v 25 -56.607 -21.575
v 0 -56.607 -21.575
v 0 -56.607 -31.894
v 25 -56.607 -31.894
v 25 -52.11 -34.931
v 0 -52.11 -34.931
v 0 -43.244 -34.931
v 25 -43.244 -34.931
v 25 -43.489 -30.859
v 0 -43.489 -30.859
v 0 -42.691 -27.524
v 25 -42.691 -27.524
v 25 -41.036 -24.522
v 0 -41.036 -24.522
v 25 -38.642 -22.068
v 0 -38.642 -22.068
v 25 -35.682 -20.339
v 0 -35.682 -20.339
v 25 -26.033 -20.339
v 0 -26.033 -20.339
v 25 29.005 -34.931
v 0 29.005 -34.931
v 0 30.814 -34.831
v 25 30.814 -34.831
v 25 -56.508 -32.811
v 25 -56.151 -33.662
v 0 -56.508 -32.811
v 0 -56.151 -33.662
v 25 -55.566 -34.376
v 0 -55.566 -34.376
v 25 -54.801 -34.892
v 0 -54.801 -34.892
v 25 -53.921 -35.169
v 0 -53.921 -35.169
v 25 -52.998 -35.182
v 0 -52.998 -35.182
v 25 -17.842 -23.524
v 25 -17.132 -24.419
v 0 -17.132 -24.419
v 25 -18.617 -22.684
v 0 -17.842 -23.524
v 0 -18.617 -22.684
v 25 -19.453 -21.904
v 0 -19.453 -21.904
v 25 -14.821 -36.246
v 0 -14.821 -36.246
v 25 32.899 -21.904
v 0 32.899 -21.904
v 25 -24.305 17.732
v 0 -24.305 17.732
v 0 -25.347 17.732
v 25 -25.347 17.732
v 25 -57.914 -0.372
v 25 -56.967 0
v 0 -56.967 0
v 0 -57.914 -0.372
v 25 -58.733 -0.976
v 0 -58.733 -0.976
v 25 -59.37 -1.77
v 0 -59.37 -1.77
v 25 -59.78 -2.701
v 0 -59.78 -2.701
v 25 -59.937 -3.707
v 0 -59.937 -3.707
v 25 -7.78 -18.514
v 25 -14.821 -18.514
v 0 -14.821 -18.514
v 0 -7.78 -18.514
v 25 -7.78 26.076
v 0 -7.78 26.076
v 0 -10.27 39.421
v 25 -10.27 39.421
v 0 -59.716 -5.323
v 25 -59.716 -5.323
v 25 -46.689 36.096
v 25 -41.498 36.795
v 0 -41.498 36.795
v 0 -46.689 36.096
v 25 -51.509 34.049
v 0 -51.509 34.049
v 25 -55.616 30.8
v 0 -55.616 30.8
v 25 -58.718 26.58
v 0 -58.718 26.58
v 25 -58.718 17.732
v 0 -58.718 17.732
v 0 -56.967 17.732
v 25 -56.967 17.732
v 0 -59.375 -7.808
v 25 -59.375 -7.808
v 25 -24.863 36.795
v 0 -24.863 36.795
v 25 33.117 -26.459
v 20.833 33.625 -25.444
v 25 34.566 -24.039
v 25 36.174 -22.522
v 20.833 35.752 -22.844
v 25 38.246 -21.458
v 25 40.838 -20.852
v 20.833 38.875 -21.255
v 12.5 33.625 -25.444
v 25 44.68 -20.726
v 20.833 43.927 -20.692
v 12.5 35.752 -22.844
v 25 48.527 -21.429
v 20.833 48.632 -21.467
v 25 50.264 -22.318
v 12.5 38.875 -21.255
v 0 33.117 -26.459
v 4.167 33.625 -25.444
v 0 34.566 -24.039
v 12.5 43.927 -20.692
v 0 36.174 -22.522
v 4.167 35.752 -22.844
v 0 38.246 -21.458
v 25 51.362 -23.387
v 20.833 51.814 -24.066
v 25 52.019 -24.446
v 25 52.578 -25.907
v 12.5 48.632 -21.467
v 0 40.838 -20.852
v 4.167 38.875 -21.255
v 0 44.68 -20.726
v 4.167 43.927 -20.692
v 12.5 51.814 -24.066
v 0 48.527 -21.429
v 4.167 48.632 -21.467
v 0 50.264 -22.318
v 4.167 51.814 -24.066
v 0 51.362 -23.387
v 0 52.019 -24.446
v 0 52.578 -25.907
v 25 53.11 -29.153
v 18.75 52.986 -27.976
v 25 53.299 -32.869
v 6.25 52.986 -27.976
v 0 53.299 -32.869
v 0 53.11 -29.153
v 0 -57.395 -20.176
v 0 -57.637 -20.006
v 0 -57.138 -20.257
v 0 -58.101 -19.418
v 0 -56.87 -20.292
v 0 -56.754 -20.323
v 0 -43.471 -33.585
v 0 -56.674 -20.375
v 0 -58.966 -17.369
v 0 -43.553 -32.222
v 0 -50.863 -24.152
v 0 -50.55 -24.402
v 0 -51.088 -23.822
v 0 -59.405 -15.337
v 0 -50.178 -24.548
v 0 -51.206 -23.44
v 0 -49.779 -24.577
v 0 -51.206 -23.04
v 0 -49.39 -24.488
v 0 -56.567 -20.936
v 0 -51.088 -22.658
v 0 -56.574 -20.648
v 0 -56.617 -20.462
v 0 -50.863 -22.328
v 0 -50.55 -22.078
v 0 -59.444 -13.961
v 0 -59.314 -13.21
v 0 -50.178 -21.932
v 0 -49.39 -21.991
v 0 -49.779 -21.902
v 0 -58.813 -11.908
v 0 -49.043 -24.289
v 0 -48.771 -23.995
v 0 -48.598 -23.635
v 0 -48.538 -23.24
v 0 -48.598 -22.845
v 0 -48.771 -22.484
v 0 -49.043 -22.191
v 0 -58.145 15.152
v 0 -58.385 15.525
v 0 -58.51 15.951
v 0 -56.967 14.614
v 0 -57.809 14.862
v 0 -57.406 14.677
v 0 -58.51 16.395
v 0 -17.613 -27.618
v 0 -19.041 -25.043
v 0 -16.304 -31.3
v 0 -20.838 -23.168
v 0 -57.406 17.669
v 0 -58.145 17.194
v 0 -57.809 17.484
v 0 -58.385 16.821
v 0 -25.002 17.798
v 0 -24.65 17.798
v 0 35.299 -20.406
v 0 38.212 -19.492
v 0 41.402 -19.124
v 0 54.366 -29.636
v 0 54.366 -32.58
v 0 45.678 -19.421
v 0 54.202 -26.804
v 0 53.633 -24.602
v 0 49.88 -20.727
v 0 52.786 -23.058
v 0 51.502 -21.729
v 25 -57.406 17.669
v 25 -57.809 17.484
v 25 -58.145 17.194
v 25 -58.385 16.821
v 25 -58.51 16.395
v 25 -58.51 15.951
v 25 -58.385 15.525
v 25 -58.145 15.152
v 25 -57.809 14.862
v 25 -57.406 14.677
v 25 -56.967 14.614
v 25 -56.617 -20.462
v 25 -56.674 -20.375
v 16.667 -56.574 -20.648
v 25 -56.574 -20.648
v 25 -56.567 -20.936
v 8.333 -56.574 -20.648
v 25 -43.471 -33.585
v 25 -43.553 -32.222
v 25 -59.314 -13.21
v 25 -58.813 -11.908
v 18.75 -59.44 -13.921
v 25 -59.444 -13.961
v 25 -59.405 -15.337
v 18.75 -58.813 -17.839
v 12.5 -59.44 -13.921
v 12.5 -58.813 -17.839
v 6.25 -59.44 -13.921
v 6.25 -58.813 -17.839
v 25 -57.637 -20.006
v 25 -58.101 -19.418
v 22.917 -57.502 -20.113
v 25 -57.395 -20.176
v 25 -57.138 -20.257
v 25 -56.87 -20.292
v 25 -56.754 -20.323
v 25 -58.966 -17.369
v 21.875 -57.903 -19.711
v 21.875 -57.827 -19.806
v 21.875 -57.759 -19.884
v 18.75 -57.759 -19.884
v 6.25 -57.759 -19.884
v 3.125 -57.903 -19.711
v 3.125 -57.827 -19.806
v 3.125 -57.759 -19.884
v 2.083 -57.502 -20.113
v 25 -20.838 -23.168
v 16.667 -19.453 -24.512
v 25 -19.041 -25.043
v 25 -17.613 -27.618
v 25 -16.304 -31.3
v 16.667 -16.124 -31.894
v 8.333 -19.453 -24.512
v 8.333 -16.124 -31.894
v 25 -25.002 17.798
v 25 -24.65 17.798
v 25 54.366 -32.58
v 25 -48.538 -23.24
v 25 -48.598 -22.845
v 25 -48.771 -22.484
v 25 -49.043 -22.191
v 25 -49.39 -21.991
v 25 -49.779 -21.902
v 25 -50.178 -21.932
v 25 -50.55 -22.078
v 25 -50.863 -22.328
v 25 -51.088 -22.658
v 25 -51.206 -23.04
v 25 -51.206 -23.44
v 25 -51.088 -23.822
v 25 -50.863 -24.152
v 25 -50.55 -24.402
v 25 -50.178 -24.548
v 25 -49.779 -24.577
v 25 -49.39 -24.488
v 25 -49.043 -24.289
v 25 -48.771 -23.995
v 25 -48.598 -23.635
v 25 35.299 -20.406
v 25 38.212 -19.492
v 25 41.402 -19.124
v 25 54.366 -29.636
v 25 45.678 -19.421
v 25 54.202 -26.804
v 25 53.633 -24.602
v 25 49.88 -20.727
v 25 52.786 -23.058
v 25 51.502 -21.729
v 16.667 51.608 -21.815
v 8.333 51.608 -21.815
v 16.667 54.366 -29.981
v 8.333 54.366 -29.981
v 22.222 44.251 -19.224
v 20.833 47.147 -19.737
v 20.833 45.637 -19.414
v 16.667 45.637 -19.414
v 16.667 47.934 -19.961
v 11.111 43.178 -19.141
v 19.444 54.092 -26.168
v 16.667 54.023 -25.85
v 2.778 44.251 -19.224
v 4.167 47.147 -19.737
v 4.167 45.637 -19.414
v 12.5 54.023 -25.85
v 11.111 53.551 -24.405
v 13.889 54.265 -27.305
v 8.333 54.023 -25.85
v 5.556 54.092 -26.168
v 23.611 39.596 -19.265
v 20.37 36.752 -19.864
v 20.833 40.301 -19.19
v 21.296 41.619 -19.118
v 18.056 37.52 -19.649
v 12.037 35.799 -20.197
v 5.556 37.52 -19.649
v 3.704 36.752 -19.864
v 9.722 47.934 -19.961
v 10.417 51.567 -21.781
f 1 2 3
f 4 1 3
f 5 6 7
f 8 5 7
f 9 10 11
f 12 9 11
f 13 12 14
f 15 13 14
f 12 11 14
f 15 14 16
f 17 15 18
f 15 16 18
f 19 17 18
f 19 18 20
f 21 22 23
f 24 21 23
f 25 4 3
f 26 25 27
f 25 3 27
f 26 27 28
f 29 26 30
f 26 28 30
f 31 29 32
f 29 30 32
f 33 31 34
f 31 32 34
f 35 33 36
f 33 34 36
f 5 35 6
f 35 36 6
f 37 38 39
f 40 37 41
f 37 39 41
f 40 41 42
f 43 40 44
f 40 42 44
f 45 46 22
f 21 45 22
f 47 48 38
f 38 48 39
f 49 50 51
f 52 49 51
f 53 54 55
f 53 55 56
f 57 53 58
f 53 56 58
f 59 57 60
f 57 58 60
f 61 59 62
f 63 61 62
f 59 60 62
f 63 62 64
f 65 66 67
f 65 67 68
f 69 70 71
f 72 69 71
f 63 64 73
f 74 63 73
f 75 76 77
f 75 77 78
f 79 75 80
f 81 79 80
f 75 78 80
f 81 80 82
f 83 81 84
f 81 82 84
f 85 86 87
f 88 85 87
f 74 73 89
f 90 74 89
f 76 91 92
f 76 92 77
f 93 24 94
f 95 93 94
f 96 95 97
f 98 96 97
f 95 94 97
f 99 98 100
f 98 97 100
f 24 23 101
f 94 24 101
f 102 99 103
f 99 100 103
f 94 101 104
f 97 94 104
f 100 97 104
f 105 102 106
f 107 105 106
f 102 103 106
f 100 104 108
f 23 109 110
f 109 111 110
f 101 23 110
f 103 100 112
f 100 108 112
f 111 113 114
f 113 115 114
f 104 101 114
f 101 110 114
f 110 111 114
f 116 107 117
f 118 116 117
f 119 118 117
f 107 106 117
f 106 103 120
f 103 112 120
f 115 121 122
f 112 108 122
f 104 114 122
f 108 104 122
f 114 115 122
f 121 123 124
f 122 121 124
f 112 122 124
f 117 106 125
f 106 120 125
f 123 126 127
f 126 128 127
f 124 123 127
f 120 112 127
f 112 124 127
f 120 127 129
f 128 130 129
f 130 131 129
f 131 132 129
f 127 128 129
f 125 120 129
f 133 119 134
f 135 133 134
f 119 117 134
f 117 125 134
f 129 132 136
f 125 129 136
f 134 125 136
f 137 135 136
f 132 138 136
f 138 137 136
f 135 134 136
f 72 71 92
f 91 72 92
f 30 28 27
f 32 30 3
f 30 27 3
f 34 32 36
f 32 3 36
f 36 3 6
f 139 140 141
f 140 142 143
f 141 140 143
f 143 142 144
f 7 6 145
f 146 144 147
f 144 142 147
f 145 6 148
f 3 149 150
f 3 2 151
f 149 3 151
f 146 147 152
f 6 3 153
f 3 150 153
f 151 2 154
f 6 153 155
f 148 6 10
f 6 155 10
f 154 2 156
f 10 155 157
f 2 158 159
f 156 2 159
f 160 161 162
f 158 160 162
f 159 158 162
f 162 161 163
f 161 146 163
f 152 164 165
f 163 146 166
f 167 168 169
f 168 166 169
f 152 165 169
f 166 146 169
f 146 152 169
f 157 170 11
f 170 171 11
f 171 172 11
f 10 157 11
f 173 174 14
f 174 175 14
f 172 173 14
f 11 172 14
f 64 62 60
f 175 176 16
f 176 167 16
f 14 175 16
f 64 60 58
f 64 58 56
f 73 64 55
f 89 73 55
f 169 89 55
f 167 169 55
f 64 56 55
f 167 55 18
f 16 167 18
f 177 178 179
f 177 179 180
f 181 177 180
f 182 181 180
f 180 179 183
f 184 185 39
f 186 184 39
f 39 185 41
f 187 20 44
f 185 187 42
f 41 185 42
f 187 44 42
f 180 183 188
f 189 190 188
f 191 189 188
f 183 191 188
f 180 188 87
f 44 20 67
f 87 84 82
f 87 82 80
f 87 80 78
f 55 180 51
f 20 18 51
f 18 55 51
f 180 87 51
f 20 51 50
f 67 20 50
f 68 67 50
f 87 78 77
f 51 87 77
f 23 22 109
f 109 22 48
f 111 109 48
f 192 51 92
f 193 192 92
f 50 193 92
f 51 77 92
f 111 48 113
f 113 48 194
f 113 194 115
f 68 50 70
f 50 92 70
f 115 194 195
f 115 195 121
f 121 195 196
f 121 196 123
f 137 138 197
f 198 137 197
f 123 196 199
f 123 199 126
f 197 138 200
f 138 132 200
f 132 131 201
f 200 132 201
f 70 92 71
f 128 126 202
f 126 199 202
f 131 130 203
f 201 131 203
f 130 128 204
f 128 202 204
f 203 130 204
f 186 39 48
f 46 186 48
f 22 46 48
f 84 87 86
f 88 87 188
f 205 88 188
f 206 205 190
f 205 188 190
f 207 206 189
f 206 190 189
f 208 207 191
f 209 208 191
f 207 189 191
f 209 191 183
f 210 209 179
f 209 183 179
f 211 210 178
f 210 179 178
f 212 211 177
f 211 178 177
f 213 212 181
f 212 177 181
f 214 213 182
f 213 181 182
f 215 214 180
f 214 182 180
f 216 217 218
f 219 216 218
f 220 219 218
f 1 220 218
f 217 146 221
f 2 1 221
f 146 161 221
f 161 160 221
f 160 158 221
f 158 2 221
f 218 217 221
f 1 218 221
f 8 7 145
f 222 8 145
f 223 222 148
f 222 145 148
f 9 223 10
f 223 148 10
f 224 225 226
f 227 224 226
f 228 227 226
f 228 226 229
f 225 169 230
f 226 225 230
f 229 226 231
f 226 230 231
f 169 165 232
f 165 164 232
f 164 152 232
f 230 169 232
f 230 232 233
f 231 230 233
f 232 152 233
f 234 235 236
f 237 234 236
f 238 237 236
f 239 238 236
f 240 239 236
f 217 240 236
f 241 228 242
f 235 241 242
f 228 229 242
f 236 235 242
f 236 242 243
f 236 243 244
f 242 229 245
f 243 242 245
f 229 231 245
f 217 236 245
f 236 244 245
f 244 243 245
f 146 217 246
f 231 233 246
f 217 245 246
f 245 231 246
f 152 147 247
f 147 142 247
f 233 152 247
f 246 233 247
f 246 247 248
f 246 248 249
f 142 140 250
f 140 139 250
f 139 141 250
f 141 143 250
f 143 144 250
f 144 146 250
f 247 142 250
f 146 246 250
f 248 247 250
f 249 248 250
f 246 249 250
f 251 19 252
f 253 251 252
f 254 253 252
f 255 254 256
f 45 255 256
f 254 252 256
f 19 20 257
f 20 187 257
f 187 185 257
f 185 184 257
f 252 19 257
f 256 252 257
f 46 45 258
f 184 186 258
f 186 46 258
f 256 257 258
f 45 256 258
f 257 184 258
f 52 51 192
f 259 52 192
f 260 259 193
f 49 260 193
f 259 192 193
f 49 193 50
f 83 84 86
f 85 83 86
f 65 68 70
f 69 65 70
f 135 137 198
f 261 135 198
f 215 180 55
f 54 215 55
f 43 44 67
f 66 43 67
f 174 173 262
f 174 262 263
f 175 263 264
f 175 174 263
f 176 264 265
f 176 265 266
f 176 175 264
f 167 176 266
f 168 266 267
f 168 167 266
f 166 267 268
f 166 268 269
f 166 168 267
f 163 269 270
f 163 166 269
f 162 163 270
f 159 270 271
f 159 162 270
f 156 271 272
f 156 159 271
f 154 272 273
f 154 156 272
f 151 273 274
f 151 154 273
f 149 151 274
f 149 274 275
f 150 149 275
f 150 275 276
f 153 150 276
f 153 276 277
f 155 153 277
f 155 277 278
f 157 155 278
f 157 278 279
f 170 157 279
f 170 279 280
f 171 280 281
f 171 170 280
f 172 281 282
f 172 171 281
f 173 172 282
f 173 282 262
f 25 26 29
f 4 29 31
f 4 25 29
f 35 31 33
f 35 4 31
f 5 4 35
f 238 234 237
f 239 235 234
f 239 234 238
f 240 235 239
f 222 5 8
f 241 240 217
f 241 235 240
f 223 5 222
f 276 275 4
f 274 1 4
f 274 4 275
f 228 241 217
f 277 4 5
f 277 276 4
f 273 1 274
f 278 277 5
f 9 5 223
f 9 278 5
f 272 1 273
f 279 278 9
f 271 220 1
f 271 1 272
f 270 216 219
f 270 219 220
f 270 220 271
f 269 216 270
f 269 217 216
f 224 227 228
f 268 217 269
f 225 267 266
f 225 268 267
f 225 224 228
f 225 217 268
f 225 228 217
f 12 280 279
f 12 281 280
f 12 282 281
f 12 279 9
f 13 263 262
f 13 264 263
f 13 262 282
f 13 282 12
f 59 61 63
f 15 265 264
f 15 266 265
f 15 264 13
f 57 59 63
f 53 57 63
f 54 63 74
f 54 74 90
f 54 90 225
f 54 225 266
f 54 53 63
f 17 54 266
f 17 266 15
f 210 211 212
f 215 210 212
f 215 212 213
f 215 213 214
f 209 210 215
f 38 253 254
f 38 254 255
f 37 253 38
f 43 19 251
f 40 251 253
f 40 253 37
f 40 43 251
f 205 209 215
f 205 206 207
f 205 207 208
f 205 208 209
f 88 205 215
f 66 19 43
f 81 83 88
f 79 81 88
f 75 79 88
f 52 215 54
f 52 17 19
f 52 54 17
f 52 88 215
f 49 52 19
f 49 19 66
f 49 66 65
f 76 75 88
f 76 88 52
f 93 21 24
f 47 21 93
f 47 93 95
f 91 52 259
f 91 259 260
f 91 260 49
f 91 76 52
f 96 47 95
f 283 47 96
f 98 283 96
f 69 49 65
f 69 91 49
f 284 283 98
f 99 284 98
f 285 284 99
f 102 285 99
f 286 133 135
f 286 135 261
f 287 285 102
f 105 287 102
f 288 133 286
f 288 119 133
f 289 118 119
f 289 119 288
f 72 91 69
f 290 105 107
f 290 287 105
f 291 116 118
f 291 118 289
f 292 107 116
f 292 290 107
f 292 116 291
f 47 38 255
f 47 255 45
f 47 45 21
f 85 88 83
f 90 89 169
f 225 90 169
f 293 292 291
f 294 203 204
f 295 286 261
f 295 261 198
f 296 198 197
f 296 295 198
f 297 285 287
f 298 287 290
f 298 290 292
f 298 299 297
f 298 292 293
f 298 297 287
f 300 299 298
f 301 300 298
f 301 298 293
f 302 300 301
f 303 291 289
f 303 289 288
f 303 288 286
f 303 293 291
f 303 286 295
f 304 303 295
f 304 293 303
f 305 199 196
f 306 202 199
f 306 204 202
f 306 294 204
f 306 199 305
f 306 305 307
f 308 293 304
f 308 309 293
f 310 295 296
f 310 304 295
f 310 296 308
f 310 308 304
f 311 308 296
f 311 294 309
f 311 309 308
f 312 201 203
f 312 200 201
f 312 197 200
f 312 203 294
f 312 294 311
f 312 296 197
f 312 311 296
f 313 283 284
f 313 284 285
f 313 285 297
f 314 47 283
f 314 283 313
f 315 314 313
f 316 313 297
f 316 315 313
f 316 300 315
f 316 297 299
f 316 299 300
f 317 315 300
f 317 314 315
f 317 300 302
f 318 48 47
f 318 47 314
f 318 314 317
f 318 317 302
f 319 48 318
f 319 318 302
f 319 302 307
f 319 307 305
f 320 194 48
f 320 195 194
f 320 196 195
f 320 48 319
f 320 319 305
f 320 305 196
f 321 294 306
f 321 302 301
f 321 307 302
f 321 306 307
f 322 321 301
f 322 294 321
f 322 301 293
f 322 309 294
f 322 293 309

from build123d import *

# Parameters (mm, degrees)
F0_R     = 1.3413013151
F1_DEPTH = 25


with BuildPart() as f1:
    # F0 (on Right) → F1 (new body)
    with BuildSketch(Plane.YZ):
        with BuildLine():
            Line((-59.7156846646, -5.3227093567), (-59.375019744, -7.8075606143))
            Line((-59.375019744, -7.8075606143), (-55.9374617497, -7.8075606143))
            Line((-55.9374617497, -7.8075606143), (-33.3346764091, -5.6247393992))
            Line((-33.3346764091, -5.6247393992), (-33.3346764091, -2.3953433202))
            Line((-33.3346764091, -2.3953433202), (-33.3346764091, 2.3429190912))
            Line((-33.3346764091, 2.3429190912), (-33.3346764091, 17.7317894995))
            Line((-33.3346764091, 17.7317894995), (-56.9665580988, 17.7317894995))
            ThreePointArc((-56.9665580988, 17.7317894995), (-58.5253667086, 16.1729808897), (-56.9665580988, 14.6141722798))
            Line((-56.9665580988, 14.6141722798), (-56.9665580988, 0))
            ThreePointArc((-56.9665580988, 0), (-59.0775962213, -1.3520532806), (-59.937197715, -3.706966294))
            Line((-59.937197715, -3.706966294), (-59.7156846646, -5.3227093567))
        make_face()
        with BuildLine():
            Line((-58.7176652625, 17.7317894995), (-56.9665580988, 17.7317894995))
            Line((-56.9665580988, 17.7317894995), (-33.3346764091, 17.7317894995))
            Line((-33.3346764091, 17.7317894995), (-25.3467038274, 17.7317894995))
            ThreePointArc((-25.3467038274, 17.7317894995), (-24.8258609208, 17.8061958286), (-24.3050180143, 17.7317894995))
            Line((-24.3050180143, 17.7317894995), (-20.1933458447, 17.7317894995))
            add(Edge.make_bspline(
                [(-20.1933458447, 17.7317894995), (-20.1273708915, 21.1809682656), (-20.2524642573, 26.8966571713), (-23.6691484873, 28.1730388401), (-25.4466654733, 28.6230146885)],
                knots=[0, 0, 0, 0, 0.5753069191, 1, 1, 1, 1], degree=3))
            Line((-25.4466654733, 28.6230146885), (-25.4466654733, 36.7948412895))
            Line((-25.4466654733, 36.7948412895), (-41.4984645322, 36.7948412895))
            ThreePointArc((-41.4984645322, 36.7948412895), (-51.5089923737, 34.0490123941), (-58.7176652625, 26.5800580382))
            Line((-58.7176652625, 26.5800580382), (-58.7176652625, 17.7317894995))
        make_face()
        with BuildLine():
            Line((-33.3346764091, 17.7317894995), (-33.3346764091, 2.3429190912))
            Line((-33.3346764091, 2.3429190912), (-25.3467038274, 3.7005587947))
            ThreePointArc((-25.3467038274, 3.7005587947), (-23.6209226102, 5.0092447236), (-22.9657124728, 7.0736282505))
            Line((-22.9657124728, 7.0736282505), (-22.9657124728, 15.9460473806))
            ThreePointArc((-22.9657124728, 15.9460473806), (-23.3377417433, 17.0621358906), (-24.3050180143, 17.7317894995))
            Line((-24.3050180143, 17.7317894995), (-25.3467038274, 17.7317894995))
            Line((-25.3467038274, 17.7317894995), (-33.3346764091, 17.7317894995))
        make_face()
        with BuildLine():
            Line((-59.375019744, -7.8075606143), (-58.812841773, -11.9081549346))
            Line((-58.812841773, -11.9081549346), (-56.2285371125, -11.9081549346))
            Line((-56.2285371125, -11.9081549346), (-55.1892034709, -20.3746967018))
            Line((-55.1892034709, -20.3746967018), (-44.014878571, -19.8975186795))
            Line((-44.014878571, -19.8975186795), (-38.4535634784, -15.2970959109))
            Line((-38.4535634784, -15.2970959109), (-7.780038286, -14.0707446262))
            Line((-7.780038286, -14.0707446262), (-7.780038286, 26.0761603713))
            Line((-7.780038286, 26.0761603713), (-10.2704176679, 39.4214987755))
            Line((-10.2704176679, 39.4214987755), (-24.8629627749, 36.7948412895))
            Line((-24.8629627749, 36.7948412895), (-25.4466654733, 36.7948412895))
            Line((-25.4466654733, 36.7948412895), (-25.4466654733, 28.6230146885))
            add(Edge.make_bspline(
                [(-20.1933458447, 17.7317894995), (-20.1273708915, 21.1809682656), (-20.2524642573, 26.8966571713), (-23.6691484873, 28.1730388401), (-25.4466654733, 28.6230146885)],
                knots=[0, 0, 0, 0, 0.5753069191, 1, 1, 1, 1], degree=3))
            Line((-20.1933458447, 17.7317894995), (-24.3050180143, 17.7317894995))
            ThreePointArc((-24.3050180143, 17.7317894995), (-23.3377417433, 17.0621358906), (-22.9657124728, 15.9460473806))
            Line((-22.9657124728, 15.9460473806), (-22.9657124728, 7.0736282505))
            ThreePointArc((-22.9657124728, 7.0736282505), (-23.6209226102, 5.0092447236), (-25.3467038274, 3.7005587947))
            Line((-25.3467038274, 3.7005587947), (-33.3346764091, 2.3429190912))
            Line((-33.3346764091, 2.3429190912), (-33.3346764091, -2.3953433202))
            Line((-33.3346764091, -2.3953433202), (-33.3346764091, -5.6247393992))
            Line((-33.3346764091, -5.6247393992), (-55.9374617497, -7.8075606143))
            Line((-55.9374617497, -7.8075606143), (-59.375019744, -7.8075606143))
        make_face()
        with BuildLine():
            Line((-33.3346764091, -10.6459222734), (-33.3346764091, -6.5242550336))
            Line((-33.3346764091, -6.5242550336), (-30.7647838399, -6.5242550336))
            Line((-30.7647838399, -6.5242550336), (-18.2555336505, -5.3161978722))
            Line((-18.2555336505, -5.3161978722), (-18.2555336505, -12.643808499))
            Line((-18.2555336505, -12.643808499), (-30.8102872972, -13.1457572697))
            Line((-30.8102872972, -13.1457572697), (-33.3346764091, -13.2466843007))
            Line((-33.3346764091, -13.2466843007), (-43.0865399539, -13.6365713552))
            Line((-43.0865399539, -13.6365713552), (-44.5091923977, -13.0241444813))
            Line((-44.5091923977, -13.0241444813), (-40.7882420624, -7.8148144776))
            Line((-40.7882420624, -7.8148144776), (-36.5414358675, -6.4670089632))
            ThreePointArc((-36.5414358675, -6.4670089632), (-38.4535634784, -8.2143949485), (-39.346460253, -10.6459222734))
            Line((-39.346460253, -10.6459222734), (-33.3346764091, -10.6459222734))
        make_face(mode=Mode.SUBTRACT)
        Polygon((-18.2555336505, -5.3161978722), (-30.7647838399, -6.5242550336), (-31.4434171614, -6.5897927622), (-30.8102872972, -13.1457572697), (-18.2555336505, -12.643808499), align=None)
        with BuildLine():
            Line((-33.3346764091, -13.2466843007), (-33.3346764091, -10.6459222734))
            Line((-33.3346764091, -10.6459222734), (-39.346460253, -10.6459222734))
            ThreePointArc((-39.346460253, -10.6459222734), (-38.4535634784, -8.2143949485), (-36.5414358675, -6.4670089632))
            Line((-36.5414358675, -6.4670089632), (-40.7882420624, -7.8148144776))
            Line((-40.7882420624, -7.8148144776), (-44.5091923977, -13.0241444813))
            Line((-44.5091923977, -13.0241444813), (-43.0865399539, -13.6365713552))
            Line((-43.0865399539, -13.6365713552), (-33.3346764091, -13.2466843007))
        make_face()
        Polygon((-30.7647838399, -6.5242550336), (-33.3346764091, -6.5242550336), (-33.3346764091, -10.6459222734), (-33.3346764091, -13.2466843007), (-30.8102872972, -13.1457572697), (-31.4434171614, -6.5897927622), align=None)
        with BuildLine():
            add(Edge.make_bspline(
                [(-58.812841773, -11.9081549346), (-59.0880915502, -12.5121118478), (-59.7415991693, -13.9438196544), (-59.0499376213, -17.7493049639), (-57.6436367472, -20.4556878145), (-56.8074801086, -20.2422530768), (-56.6742494702, -20.3746967018)],
                knots=[0, 0, 0, 0, 0.2060210321, 0.4886513543, 0.7243907608, 0.8444142223, 0.8444142223, 0.8444142223, 0.8444142223], degree=3))
            Line((-56.6742494702, -20.3746967018), (-55.1892034709, -20.3746967018))
            Line((-55.1892034709, -20.3746967018), (-56.2285371125, -11.9081549346))
            Line((-56.2285371125, -11.9081549346), (-58.812841773, -11.9081549346))
        make_face()
        with BuildLine():
            Line((-52.1095097065, -34.9311500469), (-43.2436168194, -34.9311500469))
            ThreePointArc((-43.2436168194, -34.9311500469), (-43.5297296599, -32.904680643), (-43.4886334872, -30.8585257352))
            ThreePointArc((-43.4886334872, -30.8585257352), (-43.4937767675, -30.8193585401), (-43.4987837121, -30.7801736833))
            ThreePointArc((-43.4987837121, -30.7801736833), (-41.8021007863, -23.2493696081), (-35.6815308332, -18.5450772681))
            Line((-35.6815308332, -18.5450772681), (-26.0333530605, -18.5450772681))
            ThreePointArc((-26.0333530605, -18.5450772681), (-22.5385309182, -19.8240557823), (-19.4525133934, -21.9039749354))
            Line((-19.4525133934, -21.9039749354), (-14.8206017911, -18.5140725225))
            Line((-14.8206017911, -18.5140725225), (-7.780038286, -18.5140725225))
            Line((-7.780038286, -18.5140725225), (-7.780038286, -14.0707446262))
            Line((-7.780038286, -14.0707446262), (-38.4535634784, -15.2970959109))
            Line((-38.4535634784, -15.2970959109), (-44.014878571, -19.8975186795))
            Line((-44.014878571, -19.8975186795), (-55.1892034709, -20.3746967018))
            Line((-55.1892034709, -20.3746967018), (-56.6742494702, -20.3746967018))
            add(Edge.make_bspline(
                [(-56.6742494702, -20.3746967018), (-56.5015432992, -20.5463826715), (-56.5789833997, -21.061622237), (-56.6074683325, -21.5753372759)],
                knots=[0.8444142223, 0.8444142223, 0.8444142223, 0.8444142223, 1, 1, 1, 1], degree=3))
            Line((-56.6074683325, -21.5753372759), (-56.6074683325, -31.8935360586))
            ThreePointArc((-56.6074683325, -31.8935360586), (-55.2022069666, -34.6616816563), (-52.1095097065, -34.9311500469))
        make_face()
        Polygon((-44.1664493774, -27.5487947282), (-43.4987837121, -30.7801736833), (-53.4819326623, -30.7801736833), (-53.8981630598, -27.5487947282), align=None, mode=Mode.SUBTRACT)
        with Locations((-49.8796105385, -23.2399087399)):
            Circle(F0_R, mode=Mode.SUBTRACT)
        with BuildLine():
            ThreePointArc((-43.4987837121, -30.7801736833), (-43.4937767675, -30.8193585401), (-43.4886334872, -30.8585257352))
            ThreePointArc((-43.4886334872, -30.8585257352), (-41.0356858712, -24.5223526476), (-35.6815308332, -20.3394033015))
            Line((-35.6815308332, -20.3394033015), (-26.0333530605, -20.3394033015))
            add(Edge.make_bspline(
                [(-26.0333530605, -20.3394033015), (-23.5843678368, -21.417930462), (-18.6388446996, -23.5959268726), (-16.1289011783, -31.861291049), (-15.2128944865, -34.9311500469), (-14.8206017911, -36.2458601594)],
                knots=[0, 0, 0, 0, 0.3593217541, 0.7256205678, 1, 1, 1, 1], degree=3))
            Line((-14.8206017911, -36.2458601594), (29.0052741766, -34.9311500469))
            add(Edge.make_bspline(
                [(29.0052741766, -34.9311500469), (28.9461622845, -34.6352556147), (29.0665782696, -33.4379145503), (29.1845194302, -25.1447405222), (32.8987687826, -21.9039749354)],
                knots=[0, 0, 0, 0, 0.0823028073, 0.3344678299, 0.3344678299, 0.3344678299, 0.3344678299], degree=3))
            Line((32.8987687826, -21.9039749354), (-17.1318468102, -24.4185392752))
            ThreePointArc((-17.1318468102, -24.4185392752), (-18.2221301436, -23.0966086911), (-19.4525133934, -21.9039749354))
            ThreePointArc((-19.4525133934, -21.9039749354), (-22.5385309182, -19.8240557823), (-26.0333530605, -18.5450772681))
            Line((-26.0333530605, -18.5450772681), (-35.6815308332, -18.5450772681))
            ThreePointArc((-35.6815308332, -18.5450772681), (-41.8021007863, -23.2493696081), (-43.4987837121, -30.7801736833))
        make_face()
        Polygon((-14.6168977418, -32.0090957925), (-14.6168977418, -29.7341951177), (-7.694104896, -29.5795624227), (26.7578526936, -28.8100176498), (25.0516771875, -32.0090957925), (-7.6398370158, -32.0090957925), align=None, mode=Mode.SUBTRACT)
        with BuildLine():
            add(Edge.make_bspline(
                [(29.0052741766, -34.9311500469), (28.9461622845, -34.6352556147), (29.0665782696, -33.4379145503), (29.1845194302, -25.1447405222), (32.8987687826, -21.9039749354)],
                knots=[0, 0, 0, 0, 0.0823028073, 0.3344678299, 0.3344678299, 0.3344678299, 0.3344678299], degree=3))
            Line((29.0052741766, -34.9311500469), (30.8140702546, -34.8309762776))
            add(Edge.make_bspline(
                [(30.8140702546, -34.8309762776), (31.5238965397, -31.3843514826), (32.8214249796, -25.0840864926), (38.3461393666, -20.2689368616), (48.8557950193, -20.6420321643), (52.0607659291, -23.863051692), (53.1163012832, -27.6248494452), (53.2346086426, -31.0166279818), (53.2992146909, -32.8688323498)],
                knots=[0, 0, 0, 0, 0.2073679163, 0.3790586156, 0.5860214277, 0.7202942231, 0.8472564596, 1, 1, 1, 1], degree=3))
            Line((53.2992146909, -32.8688323498), (54.3659590185, -32.5797982514))
            add(Edge.make_bspline(
                [(32.8987687826, -21.9039749354), (37.4717875773, -17.9139138137), (54.3744629803, -18.879708399), (54.3643162474, -29.5304261791), (54.3666904277, -32.2579057298), (54.3659590185, -32.5797982514)],
                knots=[0.3344678299, 0.3344678299, 0.3344678299, 0.3344678299, 0.6449357814, 0.85566776, 0.9713709584, 0.9713709584, 0.9713709584, 0.9713709584], degree=3))
        make_face()
        Polygon((26.7578526936, -28.8100176498), (-7.694104896, -29.5795624227), (-7.6398370158, -32.0090957925), (25.0516771875, -32.0090957925), align=None)
        Polygon((-53.4819326623, -30.7801736833), (-43.4987837121, -30.7801736833), (-44.1664493774, -27.5487947282), (-53.8981630598, -27.5487947282), align=None)
        Polygon((-7.694104896, -29.5795624227), (-14.6168977418, -29.7341951177), (-14.6168977418, -32.0090957925), (-7.6398370158, -32.0090957925), align=None)
    extrude(amount=F1_DEPTH)


solid = f1.part
